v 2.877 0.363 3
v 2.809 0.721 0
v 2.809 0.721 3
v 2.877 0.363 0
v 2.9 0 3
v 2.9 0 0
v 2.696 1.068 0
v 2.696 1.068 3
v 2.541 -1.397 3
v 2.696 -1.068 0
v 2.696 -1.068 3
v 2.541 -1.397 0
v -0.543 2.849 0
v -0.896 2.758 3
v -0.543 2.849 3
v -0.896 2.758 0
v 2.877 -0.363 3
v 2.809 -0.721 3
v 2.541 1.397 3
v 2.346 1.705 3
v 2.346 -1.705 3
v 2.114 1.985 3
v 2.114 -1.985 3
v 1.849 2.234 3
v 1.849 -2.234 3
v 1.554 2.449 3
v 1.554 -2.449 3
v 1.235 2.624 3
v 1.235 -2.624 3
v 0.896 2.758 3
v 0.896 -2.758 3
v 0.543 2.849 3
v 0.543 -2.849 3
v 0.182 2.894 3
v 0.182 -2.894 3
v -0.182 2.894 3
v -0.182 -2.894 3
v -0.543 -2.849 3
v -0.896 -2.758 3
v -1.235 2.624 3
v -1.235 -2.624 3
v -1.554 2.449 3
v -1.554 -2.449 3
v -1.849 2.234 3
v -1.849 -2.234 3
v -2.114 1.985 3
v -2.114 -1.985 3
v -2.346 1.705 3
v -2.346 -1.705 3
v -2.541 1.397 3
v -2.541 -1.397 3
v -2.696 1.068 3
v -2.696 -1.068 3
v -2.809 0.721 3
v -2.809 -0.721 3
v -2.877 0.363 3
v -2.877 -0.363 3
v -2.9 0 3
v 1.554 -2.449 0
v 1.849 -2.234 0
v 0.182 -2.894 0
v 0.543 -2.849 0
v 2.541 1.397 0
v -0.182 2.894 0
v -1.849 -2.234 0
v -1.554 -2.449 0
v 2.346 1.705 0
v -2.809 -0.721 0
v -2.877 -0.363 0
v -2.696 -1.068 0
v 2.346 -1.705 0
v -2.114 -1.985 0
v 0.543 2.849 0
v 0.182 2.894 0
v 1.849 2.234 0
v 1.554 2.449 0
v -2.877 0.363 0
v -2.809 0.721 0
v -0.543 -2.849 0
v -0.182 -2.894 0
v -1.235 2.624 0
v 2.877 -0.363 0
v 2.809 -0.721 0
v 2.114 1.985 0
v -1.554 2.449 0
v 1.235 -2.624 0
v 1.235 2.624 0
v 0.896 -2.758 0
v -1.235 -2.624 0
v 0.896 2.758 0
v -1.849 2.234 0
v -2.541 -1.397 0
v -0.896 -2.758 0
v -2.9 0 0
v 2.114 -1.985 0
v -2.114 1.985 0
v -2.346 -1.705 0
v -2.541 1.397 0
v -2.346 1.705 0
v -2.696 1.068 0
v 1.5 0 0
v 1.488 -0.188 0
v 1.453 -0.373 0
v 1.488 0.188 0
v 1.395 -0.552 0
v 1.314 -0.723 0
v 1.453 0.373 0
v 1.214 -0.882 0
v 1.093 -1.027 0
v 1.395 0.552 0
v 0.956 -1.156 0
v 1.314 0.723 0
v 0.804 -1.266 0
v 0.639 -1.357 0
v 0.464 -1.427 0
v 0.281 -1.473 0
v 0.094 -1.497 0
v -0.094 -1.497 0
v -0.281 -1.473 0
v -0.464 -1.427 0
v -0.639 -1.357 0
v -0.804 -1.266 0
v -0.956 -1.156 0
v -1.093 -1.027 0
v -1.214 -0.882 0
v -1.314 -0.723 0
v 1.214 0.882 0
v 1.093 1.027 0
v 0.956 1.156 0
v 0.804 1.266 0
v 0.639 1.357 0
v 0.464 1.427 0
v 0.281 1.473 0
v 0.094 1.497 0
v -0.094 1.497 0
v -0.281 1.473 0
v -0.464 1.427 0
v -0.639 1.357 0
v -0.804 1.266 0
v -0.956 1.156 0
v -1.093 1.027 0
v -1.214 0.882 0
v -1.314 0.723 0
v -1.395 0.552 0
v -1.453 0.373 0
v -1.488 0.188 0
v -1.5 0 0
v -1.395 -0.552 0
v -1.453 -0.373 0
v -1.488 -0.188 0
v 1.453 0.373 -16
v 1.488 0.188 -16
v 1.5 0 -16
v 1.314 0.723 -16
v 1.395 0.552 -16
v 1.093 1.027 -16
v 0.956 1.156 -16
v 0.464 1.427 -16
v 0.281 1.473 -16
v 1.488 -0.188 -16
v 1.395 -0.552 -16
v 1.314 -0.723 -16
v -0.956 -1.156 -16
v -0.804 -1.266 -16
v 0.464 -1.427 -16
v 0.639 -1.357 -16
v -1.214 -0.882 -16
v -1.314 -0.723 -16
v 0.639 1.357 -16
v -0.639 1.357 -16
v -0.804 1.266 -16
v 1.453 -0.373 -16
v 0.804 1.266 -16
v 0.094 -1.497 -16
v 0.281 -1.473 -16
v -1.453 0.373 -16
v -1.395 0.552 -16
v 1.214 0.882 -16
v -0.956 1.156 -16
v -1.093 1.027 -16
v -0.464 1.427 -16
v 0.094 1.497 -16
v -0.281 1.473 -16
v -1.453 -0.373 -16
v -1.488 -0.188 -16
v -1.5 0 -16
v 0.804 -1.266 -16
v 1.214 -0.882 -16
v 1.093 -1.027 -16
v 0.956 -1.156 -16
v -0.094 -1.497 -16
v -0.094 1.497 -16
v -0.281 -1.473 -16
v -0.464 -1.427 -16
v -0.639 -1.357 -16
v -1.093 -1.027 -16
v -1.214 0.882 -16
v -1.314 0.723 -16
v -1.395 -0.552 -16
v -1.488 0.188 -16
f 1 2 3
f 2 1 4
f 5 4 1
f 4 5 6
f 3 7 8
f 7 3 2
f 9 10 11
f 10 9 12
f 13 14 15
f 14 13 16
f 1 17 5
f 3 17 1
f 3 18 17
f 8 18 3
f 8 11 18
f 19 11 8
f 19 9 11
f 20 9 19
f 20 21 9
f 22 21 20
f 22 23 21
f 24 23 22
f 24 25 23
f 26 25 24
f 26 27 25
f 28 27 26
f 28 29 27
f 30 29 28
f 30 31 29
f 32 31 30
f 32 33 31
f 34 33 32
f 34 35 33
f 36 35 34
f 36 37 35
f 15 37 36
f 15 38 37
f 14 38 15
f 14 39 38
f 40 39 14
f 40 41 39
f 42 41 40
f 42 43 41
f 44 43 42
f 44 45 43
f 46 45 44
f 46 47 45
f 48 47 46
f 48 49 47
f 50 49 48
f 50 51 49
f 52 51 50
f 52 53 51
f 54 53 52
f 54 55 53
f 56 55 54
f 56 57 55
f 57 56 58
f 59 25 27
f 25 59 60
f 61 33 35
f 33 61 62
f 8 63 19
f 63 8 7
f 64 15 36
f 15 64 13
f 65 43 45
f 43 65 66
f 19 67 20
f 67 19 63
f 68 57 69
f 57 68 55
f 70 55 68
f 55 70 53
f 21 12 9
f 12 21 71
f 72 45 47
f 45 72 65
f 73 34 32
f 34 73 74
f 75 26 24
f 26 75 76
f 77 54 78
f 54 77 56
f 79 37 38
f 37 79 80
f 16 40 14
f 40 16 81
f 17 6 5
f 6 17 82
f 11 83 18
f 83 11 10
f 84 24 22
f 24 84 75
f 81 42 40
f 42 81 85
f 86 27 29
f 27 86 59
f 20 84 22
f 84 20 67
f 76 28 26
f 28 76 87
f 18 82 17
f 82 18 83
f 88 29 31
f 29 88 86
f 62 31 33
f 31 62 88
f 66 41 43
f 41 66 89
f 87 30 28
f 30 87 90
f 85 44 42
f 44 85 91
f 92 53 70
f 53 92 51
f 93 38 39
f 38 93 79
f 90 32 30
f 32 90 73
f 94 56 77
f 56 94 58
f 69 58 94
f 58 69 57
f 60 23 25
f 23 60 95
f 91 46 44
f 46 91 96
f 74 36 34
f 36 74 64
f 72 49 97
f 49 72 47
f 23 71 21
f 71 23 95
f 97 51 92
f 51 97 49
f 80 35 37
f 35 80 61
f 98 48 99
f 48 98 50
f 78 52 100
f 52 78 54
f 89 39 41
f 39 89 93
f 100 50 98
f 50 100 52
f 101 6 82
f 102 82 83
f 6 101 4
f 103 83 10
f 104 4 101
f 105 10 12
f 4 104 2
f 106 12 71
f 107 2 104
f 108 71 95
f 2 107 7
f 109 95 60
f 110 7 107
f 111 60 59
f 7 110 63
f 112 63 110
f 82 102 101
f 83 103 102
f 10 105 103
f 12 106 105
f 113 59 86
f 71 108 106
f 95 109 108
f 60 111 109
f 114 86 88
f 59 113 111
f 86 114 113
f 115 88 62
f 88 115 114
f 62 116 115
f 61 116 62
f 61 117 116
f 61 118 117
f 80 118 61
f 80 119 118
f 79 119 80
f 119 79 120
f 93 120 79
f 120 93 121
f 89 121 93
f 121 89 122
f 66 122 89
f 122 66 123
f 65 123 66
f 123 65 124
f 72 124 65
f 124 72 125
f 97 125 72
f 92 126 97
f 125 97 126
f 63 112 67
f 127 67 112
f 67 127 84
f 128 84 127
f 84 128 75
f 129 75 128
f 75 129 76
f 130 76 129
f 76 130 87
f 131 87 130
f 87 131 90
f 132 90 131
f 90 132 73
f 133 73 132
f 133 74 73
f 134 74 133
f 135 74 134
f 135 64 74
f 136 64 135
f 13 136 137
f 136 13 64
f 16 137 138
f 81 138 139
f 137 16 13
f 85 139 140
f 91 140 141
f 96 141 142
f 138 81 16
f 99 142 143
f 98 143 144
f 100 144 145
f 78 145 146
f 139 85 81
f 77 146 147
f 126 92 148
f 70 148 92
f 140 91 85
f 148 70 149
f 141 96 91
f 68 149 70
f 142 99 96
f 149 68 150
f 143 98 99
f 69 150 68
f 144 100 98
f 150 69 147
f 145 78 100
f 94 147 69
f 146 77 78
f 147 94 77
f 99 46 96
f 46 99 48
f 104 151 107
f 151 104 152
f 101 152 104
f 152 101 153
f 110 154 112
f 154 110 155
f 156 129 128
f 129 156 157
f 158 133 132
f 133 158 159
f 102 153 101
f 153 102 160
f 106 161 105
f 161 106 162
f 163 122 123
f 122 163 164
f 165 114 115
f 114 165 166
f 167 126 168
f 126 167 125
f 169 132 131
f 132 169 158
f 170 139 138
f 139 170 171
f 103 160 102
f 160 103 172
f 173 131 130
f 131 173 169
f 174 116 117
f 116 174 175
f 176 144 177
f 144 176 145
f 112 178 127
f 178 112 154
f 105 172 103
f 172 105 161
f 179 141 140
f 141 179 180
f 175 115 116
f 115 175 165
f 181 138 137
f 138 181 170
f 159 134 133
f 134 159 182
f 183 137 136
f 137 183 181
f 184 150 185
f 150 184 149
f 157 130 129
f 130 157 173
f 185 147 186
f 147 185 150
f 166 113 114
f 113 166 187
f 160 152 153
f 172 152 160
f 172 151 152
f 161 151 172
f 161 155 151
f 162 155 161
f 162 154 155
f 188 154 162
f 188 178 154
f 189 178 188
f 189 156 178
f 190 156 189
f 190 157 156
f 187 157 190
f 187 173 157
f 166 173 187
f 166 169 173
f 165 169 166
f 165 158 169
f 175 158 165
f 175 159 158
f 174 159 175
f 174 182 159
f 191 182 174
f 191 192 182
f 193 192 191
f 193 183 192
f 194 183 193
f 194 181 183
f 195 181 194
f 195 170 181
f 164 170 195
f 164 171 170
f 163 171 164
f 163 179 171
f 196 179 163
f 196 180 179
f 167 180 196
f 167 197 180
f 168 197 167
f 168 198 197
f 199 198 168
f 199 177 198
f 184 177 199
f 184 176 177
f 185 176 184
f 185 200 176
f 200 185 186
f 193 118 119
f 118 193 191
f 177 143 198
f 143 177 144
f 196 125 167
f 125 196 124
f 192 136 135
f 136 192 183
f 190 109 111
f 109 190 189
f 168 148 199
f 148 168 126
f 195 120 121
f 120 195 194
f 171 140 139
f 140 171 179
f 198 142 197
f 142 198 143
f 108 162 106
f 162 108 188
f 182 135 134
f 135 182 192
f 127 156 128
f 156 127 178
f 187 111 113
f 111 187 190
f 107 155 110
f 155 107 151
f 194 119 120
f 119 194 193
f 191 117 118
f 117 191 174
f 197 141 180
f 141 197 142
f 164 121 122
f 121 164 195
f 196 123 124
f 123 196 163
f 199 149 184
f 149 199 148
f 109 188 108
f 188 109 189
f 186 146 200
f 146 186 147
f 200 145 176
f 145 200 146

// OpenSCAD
$fn = 50;

difference() {
	union() {
		translate(v = [0, 0, 0]) {
			rotate(a = [0, 0, 0]) {
				difference() {
					union() {
						cylinder(h = 3, r = 2.9);
						translate(v = [0, 0, -16.0]) {
							cylinder(h = 16, r = 1.5);
						}
					}
					union();
				}
			}
		}
	}
	union();
}
